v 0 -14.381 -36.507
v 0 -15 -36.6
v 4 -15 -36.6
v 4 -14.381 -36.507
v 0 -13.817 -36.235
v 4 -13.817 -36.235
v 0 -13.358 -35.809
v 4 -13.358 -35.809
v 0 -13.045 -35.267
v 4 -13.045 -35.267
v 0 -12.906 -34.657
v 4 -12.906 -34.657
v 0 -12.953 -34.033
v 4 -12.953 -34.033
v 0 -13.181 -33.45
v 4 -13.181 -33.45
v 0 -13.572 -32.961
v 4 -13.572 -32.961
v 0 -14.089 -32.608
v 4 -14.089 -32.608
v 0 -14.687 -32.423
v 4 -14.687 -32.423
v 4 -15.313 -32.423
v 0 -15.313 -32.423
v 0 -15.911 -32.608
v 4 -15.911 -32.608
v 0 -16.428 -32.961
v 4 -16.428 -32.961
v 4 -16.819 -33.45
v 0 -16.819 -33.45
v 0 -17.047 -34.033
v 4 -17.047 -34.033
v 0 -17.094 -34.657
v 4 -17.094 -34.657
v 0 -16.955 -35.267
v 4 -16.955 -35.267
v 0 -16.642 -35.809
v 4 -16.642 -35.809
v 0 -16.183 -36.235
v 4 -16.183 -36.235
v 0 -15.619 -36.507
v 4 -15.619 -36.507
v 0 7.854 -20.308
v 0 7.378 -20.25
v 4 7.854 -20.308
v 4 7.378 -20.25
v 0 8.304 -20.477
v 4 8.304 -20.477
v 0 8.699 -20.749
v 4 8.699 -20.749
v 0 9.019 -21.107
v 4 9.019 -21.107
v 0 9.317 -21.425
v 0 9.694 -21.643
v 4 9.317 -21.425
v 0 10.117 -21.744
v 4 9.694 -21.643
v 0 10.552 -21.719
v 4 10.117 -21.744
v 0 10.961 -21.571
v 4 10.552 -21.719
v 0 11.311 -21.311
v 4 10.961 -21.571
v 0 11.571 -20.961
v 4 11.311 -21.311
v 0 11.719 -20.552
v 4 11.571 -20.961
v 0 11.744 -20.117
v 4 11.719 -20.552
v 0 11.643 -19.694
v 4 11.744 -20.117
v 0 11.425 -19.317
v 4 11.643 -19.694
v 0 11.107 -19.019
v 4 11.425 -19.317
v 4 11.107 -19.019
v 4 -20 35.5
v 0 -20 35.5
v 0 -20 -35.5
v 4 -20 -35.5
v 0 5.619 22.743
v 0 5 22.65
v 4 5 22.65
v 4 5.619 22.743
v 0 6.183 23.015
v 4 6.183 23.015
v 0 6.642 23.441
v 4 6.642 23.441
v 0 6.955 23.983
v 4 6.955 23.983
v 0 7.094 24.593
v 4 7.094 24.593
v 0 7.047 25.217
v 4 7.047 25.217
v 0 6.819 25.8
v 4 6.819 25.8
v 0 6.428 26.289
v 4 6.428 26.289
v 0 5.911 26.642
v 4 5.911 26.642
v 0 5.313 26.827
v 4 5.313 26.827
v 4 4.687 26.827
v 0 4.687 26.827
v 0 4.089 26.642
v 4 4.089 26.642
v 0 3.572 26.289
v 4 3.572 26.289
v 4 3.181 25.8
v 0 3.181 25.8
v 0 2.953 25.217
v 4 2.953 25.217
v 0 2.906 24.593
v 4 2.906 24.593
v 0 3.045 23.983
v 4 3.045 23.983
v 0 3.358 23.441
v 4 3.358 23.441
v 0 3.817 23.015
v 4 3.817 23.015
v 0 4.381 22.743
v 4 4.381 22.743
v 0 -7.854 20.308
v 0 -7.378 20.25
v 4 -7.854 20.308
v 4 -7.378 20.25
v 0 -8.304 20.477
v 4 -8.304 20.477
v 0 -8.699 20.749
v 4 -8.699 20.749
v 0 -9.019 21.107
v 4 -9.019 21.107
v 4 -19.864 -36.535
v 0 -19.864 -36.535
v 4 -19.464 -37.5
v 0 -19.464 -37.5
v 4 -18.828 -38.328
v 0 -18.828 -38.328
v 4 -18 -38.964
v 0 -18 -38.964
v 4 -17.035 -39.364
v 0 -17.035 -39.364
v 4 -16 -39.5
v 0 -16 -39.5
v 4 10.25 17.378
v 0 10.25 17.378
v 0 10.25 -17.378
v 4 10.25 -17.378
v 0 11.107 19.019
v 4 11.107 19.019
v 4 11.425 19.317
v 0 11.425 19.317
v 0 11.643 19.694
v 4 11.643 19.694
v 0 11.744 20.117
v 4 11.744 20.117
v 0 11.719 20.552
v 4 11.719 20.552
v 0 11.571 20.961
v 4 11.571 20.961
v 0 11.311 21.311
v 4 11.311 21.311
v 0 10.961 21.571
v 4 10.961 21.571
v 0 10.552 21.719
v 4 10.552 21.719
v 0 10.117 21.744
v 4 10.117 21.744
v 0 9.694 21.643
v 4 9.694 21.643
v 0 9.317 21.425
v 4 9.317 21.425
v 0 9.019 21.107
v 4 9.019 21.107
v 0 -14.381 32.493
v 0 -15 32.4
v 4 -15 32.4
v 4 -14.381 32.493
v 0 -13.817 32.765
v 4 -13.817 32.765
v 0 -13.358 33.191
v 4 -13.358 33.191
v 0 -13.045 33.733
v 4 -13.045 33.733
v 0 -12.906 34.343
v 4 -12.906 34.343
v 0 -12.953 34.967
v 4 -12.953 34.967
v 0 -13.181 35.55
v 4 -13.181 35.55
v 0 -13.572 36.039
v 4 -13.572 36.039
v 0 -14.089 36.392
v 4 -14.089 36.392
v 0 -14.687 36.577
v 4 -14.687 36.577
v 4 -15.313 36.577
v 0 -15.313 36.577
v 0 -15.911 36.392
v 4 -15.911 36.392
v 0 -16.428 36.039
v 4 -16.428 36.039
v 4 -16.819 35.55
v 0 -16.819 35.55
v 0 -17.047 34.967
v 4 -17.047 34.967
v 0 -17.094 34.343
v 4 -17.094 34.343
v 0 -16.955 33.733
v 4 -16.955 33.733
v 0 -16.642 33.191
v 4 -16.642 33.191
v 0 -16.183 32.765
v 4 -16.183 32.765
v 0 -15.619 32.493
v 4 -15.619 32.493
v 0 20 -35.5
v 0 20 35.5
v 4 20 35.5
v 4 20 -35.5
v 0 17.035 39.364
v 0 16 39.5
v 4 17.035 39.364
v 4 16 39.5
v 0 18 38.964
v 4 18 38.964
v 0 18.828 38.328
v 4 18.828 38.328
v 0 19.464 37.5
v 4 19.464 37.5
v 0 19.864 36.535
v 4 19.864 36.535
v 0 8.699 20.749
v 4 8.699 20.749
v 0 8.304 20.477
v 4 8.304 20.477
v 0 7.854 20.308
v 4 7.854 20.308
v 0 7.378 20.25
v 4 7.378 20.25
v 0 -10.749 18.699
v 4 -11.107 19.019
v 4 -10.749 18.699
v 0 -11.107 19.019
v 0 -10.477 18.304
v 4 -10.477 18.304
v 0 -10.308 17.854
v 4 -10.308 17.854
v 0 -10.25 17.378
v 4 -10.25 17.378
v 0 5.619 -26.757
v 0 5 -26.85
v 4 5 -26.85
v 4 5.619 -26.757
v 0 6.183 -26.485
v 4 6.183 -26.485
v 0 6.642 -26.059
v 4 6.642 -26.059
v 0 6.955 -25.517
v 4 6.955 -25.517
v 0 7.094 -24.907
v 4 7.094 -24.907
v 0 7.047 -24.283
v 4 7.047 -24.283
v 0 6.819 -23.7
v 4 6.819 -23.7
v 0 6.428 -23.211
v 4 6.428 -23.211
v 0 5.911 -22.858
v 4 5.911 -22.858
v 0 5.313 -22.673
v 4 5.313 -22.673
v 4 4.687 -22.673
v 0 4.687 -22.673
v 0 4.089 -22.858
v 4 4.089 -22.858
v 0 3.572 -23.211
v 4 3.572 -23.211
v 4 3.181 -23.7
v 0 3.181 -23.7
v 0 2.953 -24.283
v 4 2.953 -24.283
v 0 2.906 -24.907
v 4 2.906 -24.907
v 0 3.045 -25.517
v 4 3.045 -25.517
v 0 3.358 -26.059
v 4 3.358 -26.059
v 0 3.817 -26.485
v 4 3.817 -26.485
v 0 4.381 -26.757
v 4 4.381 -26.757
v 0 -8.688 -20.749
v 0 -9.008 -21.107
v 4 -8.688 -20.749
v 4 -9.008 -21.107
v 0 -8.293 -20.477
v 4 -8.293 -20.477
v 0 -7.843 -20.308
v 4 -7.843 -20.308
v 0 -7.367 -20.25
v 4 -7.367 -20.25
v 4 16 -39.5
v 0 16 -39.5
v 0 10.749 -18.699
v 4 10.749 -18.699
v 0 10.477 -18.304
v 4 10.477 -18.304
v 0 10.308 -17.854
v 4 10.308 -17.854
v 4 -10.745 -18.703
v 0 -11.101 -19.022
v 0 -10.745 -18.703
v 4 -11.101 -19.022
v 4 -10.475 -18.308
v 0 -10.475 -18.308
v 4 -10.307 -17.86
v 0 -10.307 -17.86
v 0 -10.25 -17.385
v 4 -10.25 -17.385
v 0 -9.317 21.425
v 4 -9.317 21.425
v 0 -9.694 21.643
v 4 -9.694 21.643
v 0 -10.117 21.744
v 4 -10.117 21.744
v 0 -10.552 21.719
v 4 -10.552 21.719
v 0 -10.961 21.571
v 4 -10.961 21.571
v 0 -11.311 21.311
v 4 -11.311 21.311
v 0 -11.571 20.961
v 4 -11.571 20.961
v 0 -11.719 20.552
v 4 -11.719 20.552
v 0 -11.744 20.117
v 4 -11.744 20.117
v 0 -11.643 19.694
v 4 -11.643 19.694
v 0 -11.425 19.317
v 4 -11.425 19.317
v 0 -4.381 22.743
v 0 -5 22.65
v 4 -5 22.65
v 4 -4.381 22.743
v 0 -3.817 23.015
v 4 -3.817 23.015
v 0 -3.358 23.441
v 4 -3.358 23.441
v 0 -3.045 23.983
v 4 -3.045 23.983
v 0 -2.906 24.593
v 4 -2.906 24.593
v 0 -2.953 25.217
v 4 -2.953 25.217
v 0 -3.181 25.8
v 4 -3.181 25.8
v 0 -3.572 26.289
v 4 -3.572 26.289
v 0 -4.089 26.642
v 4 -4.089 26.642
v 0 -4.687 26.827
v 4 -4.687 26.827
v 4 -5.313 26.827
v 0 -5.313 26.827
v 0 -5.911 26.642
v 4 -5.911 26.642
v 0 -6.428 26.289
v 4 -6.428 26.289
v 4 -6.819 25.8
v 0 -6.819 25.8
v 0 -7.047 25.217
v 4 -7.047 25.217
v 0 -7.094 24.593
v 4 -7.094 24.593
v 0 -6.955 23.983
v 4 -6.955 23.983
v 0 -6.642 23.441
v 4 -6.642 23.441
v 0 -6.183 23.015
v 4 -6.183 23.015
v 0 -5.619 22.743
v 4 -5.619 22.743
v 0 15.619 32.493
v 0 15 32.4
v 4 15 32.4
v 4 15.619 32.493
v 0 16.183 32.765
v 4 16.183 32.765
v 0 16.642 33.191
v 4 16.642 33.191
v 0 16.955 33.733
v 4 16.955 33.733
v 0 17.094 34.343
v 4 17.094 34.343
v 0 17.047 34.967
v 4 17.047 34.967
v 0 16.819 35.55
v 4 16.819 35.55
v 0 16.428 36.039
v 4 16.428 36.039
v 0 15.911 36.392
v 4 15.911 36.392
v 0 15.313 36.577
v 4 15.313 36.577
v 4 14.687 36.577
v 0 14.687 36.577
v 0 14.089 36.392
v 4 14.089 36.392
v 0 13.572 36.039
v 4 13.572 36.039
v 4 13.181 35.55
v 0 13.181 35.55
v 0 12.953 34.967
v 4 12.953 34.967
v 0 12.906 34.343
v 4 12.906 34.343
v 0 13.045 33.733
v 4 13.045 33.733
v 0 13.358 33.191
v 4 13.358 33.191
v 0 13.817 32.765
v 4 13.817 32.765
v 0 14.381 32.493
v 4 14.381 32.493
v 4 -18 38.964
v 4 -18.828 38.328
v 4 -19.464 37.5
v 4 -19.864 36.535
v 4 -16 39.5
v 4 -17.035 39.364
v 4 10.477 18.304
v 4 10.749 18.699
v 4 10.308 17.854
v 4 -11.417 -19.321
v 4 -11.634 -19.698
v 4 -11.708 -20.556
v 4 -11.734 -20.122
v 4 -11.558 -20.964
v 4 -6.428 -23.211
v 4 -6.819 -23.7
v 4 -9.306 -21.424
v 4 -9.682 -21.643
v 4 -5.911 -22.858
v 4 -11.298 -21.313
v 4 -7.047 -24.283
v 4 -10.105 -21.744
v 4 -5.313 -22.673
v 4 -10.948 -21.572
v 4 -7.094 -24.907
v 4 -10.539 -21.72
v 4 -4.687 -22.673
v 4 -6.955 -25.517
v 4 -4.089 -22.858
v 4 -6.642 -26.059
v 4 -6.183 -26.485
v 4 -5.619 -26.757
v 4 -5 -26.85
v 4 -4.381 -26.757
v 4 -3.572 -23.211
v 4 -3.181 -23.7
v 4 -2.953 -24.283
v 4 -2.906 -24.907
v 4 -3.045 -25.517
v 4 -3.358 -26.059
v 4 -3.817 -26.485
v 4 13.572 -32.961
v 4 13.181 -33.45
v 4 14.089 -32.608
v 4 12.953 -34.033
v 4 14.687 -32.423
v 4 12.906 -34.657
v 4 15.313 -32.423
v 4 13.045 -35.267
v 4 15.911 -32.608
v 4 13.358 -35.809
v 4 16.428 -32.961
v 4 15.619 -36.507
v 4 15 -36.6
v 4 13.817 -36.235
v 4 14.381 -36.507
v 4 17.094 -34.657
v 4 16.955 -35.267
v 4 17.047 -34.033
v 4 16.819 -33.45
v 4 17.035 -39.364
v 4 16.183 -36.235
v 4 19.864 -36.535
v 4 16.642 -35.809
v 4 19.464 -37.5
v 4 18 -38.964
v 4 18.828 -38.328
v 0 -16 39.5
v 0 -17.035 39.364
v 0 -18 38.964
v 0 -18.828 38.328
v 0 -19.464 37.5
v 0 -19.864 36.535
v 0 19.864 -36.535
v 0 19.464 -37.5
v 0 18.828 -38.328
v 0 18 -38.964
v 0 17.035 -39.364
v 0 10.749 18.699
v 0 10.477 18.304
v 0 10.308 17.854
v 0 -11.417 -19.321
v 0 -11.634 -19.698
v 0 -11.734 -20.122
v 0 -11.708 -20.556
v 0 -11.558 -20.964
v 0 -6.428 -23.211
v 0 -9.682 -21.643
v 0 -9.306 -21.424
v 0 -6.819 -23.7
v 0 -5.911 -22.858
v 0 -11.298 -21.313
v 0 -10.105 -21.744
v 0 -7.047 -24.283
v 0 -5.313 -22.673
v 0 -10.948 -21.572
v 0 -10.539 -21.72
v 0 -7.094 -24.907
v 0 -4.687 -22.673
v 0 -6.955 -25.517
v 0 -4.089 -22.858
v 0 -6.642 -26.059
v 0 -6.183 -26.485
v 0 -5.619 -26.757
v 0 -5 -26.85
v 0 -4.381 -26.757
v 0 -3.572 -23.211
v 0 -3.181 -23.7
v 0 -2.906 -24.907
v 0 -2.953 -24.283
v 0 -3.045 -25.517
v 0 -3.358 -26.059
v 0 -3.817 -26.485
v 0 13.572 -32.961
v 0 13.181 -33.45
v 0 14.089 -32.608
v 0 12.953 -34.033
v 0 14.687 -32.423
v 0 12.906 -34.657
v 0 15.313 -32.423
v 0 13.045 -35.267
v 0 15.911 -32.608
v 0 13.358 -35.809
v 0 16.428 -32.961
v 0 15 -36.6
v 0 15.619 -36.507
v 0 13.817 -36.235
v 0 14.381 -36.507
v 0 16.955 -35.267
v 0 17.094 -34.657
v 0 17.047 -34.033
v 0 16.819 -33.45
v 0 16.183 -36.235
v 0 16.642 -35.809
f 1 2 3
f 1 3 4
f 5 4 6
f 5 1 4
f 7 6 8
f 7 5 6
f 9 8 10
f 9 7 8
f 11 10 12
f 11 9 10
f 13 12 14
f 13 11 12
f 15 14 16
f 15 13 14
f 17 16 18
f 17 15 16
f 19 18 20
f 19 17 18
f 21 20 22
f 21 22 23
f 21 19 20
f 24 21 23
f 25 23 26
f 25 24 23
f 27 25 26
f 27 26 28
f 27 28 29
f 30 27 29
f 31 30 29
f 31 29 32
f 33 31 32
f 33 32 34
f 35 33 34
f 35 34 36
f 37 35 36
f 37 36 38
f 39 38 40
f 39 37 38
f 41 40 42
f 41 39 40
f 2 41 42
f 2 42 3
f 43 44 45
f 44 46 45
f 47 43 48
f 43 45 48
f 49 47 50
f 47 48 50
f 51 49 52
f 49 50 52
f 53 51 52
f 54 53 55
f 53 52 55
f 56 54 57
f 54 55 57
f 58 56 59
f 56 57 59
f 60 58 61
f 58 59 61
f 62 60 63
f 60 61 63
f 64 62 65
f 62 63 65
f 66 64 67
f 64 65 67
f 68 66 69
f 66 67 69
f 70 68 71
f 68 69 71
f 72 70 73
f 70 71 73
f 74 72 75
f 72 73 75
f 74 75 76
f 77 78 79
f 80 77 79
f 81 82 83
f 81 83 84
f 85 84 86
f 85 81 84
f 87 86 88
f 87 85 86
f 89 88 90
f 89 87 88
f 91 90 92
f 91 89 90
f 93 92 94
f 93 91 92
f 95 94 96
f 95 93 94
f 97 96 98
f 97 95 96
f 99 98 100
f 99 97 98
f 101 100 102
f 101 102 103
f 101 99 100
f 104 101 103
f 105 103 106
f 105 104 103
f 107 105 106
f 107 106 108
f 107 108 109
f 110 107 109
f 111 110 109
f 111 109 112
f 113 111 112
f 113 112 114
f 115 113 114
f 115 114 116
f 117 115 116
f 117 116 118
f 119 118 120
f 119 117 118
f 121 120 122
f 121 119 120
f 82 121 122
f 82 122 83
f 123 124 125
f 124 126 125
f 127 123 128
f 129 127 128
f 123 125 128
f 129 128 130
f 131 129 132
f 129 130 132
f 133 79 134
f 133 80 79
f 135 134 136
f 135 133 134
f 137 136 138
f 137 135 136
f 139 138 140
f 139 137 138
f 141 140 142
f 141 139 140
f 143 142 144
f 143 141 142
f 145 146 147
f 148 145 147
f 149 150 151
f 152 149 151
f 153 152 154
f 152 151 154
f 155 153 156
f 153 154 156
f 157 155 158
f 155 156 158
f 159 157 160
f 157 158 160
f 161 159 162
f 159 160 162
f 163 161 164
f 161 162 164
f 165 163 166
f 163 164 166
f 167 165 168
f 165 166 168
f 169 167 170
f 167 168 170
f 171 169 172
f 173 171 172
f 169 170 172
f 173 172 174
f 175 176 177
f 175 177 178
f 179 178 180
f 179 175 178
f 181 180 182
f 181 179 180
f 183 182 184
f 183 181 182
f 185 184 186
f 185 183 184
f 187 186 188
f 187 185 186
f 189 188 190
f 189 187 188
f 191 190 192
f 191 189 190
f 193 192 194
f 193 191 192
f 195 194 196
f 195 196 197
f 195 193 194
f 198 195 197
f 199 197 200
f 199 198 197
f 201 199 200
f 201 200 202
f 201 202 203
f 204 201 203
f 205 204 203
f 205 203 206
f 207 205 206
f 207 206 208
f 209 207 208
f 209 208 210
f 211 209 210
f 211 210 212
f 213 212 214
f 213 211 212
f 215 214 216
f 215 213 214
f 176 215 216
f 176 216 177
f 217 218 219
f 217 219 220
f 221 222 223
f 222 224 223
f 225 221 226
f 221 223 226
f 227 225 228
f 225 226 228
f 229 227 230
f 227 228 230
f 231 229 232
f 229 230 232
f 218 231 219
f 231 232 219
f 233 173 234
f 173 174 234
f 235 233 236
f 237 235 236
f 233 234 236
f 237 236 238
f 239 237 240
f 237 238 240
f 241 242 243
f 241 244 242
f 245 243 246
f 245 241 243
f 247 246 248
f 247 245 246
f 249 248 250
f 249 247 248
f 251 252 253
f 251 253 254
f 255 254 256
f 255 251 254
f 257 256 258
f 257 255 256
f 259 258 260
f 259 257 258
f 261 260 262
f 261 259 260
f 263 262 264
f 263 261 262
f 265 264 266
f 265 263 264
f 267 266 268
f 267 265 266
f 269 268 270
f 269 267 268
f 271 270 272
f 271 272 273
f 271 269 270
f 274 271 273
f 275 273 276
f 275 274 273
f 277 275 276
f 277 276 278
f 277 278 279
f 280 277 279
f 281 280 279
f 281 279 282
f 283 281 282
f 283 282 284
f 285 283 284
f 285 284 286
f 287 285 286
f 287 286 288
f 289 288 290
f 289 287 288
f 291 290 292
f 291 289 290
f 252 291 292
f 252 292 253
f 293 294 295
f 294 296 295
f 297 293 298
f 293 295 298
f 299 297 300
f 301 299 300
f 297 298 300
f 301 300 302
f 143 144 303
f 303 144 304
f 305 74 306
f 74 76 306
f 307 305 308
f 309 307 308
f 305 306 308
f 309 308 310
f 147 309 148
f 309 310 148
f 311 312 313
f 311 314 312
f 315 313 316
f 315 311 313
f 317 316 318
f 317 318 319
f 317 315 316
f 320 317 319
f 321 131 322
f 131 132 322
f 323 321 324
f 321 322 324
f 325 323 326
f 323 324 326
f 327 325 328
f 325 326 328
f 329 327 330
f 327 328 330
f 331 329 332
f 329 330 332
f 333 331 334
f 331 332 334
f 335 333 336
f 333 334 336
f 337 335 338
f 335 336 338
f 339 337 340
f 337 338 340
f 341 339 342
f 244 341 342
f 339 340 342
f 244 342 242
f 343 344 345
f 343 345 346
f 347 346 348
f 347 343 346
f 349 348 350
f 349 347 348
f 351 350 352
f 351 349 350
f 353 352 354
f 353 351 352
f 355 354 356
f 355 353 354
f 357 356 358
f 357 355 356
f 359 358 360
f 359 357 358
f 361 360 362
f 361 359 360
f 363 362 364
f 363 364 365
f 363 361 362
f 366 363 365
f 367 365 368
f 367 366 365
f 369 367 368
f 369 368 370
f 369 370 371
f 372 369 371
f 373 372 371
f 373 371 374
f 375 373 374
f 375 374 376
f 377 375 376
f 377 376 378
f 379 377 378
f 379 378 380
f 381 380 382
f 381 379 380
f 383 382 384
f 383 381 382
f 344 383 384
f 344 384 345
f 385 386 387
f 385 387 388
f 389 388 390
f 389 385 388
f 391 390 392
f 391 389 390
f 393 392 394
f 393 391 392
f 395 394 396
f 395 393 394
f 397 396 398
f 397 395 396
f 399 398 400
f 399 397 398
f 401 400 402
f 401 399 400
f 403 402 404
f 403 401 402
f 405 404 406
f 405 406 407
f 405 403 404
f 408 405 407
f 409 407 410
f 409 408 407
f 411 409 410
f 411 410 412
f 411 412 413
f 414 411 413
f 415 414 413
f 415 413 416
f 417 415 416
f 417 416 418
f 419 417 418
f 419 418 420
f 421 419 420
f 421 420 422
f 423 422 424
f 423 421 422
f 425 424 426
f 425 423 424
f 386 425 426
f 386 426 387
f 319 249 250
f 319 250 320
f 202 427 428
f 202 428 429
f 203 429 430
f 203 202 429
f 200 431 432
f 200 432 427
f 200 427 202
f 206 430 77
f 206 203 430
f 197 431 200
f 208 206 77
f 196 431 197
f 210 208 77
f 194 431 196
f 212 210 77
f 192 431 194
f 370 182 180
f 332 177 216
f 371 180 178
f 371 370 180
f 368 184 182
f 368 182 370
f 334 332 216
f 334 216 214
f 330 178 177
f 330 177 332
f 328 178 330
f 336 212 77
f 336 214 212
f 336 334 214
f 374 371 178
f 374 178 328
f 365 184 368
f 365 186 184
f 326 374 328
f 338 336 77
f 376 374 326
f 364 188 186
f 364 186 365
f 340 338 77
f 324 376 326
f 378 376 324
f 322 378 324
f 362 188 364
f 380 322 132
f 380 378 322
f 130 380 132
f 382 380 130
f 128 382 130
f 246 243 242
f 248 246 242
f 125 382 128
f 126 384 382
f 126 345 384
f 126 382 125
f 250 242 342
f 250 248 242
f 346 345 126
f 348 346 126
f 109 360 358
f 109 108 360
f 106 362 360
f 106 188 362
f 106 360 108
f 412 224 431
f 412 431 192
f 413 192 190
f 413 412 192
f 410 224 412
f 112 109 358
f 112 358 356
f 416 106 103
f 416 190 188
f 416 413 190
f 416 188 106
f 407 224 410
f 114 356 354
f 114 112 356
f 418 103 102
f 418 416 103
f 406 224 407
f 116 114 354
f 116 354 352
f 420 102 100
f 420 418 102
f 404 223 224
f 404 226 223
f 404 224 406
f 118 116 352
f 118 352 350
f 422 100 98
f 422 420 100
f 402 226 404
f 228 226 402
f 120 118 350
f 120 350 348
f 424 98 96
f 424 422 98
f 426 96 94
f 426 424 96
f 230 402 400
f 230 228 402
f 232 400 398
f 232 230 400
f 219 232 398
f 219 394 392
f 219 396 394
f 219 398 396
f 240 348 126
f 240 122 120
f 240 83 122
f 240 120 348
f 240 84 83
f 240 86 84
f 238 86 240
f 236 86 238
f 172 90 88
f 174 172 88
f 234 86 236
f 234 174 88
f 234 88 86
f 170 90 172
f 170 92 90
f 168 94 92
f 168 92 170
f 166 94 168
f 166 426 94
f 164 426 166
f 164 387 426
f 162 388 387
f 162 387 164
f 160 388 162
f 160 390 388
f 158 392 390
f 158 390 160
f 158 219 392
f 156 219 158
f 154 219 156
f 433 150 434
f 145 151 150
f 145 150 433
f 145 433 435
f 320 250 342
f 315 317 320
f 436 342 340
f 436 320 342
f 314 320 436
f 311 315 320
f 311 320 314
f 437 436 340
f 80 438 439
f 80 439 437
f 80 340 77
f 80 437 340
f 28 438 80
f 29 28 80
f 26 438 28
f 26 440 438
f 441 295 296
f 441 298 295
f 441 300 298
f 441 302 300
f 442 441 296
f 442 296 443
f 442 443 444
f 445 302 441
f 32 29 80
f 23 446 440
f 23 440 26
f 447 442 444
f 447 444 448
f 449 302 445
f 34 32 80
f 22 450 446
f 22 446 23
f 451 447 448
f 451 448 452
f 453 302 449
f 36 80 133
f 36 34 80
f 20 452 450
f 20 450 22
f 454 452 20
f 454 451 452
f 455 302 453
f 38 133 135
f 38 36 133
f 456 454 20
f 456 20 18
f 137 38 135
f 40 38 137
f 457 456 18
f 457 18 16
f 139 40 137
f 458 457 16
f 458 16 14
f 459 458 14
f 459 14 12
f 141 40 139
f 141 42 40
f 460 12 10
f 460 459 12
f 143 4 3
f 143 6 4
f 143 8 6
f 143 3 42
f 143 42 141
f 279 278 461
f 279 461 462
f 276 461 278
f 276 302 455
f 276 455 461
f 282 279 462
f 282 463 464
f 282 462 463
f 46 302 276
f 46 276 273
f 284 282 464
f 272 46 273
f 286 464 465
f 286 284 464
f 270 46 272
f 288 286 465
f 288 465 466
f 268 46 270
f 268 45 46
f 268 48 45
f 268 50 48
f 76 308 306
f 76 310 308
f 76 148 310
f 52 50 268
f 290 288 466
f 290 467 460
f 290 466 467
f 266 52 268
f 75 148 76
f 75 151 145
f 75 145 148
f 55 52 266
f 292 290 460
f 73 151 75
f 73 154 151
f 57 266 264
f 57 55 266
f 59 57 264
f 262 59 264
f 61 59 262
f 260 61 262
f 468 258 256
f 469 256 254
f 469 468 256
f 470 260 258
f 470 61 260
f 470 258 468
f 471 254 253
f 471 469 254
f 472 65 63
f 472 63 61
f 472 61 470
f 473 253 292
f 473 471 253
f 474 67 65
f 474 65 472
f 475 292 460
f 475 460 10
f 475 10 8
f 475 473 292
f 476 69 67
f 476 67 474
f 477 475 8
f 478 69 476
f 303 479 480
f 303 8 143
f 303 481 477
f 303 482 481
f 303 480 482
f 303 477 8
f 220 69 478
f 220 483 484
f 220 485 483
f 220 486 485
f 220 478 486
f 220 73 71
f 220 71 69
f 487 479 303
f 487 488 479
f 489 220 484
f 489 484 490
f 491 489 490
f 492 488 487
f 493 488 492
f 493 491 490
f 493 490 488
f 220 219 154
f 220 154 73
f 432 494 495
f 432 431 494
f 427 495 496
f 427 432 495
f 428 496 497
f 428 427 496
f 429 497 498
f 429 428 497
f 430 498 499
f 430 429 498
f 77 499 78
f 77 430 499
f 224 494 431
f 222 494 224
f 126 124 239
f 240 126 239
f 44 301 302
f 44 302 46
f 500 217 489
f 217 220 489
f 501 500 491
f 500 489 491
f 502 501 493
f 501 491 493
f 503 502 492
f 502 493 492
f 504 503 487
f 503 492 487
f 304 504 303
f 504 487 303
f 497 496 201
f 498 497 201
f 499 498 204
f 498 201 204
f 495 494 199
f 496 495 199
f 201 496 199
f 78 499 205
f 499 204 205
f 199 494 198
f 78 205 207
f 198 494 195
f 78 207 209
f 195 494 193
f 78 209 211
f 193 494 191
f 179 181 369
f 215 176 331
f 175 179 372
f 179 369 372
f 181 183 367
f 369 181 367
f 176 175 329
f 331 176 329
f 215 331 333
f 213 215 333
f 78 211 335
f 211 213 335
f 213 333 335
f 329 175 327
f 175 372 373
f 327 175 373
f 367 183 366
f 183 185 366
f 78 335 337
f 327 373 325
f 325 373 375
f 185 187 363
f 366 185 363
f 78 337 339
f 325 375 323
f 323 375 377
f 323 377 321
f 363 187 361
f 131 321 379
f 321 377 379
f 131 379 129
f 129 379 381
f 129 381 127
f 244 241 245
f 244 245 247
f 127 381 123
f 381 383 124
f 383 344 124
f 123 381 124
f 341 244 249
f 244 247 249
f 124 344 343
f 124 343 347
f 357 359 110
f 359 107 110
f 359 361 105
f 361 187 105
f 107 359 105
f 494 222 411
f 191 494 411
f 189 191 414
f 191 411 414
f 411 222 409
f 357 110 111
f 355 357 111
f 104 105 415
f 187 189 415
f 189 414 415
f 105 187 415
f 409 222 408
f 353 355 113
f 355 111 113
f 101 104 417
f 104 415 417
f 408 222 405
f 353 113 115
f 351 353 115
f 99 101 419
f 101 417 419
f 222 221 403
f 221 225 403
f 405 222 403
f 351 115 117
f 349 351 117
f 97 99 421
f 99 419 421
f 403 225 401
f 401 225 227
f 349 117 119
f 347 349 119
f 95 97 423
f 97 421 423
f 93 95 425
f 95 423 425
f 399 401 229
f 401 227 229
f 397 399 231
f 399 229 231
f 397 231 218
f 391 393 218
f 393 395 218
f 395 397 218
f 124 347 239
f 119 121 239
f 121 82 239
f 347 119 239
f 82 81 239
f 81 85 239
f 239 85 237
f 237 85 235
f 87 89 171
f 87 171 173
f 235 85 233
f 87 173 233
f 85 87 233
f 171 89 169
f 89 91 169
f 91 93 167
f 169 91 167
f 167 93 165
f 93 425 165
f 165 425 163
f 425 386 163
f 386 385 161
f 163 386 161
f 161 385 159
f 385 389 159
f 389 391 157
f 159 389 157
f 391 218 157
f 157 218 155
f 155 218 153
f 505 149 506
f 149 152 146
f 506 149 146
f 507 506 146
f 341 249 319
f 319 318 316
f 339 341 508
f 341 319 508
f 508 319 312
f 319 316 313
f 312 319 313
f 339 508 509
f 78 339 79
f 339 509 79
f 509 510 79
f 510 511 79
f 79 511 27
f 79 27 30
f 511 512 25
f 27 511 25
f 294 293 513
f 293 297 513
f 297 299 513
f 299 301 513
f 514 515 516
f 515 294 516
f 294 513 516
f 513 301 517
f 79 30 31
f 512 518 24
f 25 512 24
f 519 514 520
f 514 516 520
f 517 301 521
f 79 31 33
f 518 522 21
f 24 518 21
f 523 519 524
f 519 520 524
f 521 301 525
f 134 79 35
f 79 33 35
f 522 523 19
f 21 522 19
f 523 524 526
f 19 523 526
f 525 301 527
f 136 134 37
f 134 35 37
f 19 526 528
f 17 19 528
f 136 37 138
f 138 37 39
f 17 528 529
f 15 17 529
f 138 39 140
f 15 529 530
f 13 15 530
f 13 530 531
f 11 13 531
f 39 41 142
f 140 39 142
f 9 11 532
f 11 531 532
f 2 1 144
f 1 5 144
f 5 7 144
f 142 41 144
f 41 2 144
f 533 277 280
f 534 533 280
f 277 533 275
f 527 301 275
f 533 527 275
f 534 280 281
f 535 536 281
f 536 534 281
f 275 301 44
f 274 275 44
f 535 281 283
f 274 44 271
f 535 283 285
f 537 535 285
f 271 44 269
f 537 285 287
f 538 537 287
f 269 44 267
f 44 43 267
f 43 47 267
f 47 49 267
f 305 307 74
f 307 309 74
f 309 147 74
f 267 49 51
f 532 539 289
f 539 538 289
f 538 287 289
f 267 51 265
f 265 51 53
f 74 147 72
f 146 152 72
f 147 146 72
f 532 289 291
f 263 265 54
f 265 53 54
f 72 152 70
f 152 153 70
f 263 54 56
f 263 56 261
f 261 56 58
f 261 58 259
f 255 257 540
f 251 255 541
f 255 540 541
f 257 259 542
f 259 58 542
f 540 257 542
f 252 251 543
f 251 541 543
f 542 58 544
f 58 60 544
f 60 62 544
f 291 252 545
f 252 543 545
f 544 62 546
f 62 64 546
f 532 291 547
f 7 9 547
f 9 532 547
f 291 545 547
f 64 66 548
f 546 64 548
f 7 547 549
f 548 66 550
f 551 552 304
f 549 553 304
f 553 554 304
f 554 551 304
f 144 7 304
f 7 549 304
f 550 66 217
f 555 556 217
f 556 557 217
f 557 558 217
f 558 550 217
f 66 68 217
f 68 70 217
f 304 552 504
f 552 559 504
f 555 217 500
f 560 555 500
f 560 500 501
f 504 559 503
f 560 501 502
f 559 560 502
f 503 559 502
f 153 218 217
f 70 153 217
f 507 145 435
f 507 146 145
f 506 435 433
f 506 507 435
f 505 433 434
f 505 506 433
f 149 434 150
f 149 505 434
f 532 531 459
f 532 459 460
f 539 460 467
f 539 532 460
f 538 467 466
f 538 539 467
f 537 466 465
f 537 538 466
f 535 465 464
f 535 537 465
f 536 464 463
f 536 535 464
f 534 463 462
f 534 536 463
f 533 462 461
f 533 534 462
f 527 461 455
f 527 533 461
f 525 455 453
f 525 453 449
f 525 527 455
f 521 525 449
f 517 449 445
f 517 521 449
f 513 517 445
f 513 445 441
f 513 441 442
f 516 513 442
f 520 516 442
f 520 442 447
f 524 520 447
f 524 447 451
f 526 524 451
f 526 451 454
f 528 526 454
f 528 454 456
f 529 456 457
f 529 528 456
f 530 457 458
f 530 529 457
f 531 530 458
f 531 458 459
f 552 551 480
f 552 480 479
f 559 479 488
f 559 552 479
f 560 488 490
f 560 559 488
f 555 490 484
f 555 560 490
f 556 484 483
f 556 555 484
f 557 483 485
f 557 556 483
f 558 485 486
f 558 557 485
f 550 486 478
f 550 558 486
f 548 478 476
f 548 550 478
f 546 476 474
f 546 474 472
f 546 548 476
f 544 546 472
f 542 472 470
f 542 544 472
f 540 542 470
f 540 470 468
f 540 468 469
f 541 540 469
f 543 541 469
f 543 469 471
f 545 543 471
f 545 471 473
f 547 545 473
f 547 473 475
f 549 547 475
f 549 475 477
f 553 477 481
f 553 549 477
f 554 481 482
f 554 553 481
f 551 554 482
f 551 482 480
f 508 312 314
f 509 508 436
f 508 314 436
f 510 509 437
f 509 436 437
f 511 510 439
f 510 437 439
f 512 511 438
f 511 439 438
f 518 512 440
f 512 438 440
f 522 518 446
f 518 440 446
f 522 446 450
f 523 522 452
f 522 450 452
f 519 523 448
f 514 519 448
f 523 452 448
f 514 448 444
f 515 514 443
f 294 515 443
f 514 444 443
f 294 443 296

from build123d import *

# Parameters (mm, degrees)
SKETCH_1_W          = 79
SKETCH_1_H          = 40
SKETCH_1_R          = 2.1
SKETCH_1_W_2        = 40.5
SKETCH_1_H_2        = 20.5
EXTRUDE_1_DEPTH     = 4
FILLET_1_R          = 4
SKETCH_2_R          = 1.5
CUT_EXTRUDE_1_DEPTH = 10
FILLET_2_R          = 2


with BuildPart() as part:
    # 草图1 → 凸台-拉伸1 (new body)
    with BuildSketch(Plane(origin=(0, 0, 0), x_dir=(0, 0, -1), z_dir=(1, 0, 0))):
        Rectangle(SKETCH_1_W, SKETCH_1_H)
        with Locations((-34.5, 15)):
            Circle(SKETCH_1_R, mode=Mode.SUBTRACT)
        with Locations((-34.5, -15)):
            Circle(SKETCH_1_R, mode=Mode.SUBTRACT)
        with Locations((-24.75, -5)):
            Circle(SKETCH_1_R, mode=Mode.SUBTRACT)
        with Locations((-24.75, 5)):
            Circle(SKETCH_1_R, mode=Mode.SUBTRACT)
        with Locations((24.75, 5)):
            Circle(SKETCH_1_R, mode=Mode.SUBTRACT)
        with Locations((24.75, -5)):
            Circle(SKETCH_1_R, mode=Mode.SUBTRACT)
        with Locations((34.5, 15)):
            Circle(SKETCH_1_R, mode=Mode.SUBTRACT)
        with Locations((34.5, -15)):
            Circle(SKETCH_1_R, mode=Mode.SUBTRACT)
        Rectangle(SKETCH_1_W_2, SKETCH_1_H_2, mode=Mode.SUBTRACT)
    extrude(amount=EXTRUDE_1_DEPTH)

    # 圆角1
    fillet_1_edges = [part.edges().sort_by_distance(p)[0] for p in [
        (2, -20, -39.5),
        (2, -20, 39.5),
        (2, 20, 39.5),
        (2, 20, -39.5),
    ]]
    fillet(fillet_1_edges, radius=FILLET_1_R)

    # 草图2 → 切除-拉伸1 (cut)
    with BuildSketch(Plane(origin=(4, 0, 0), x_dir=(0, 0, -1), z_dir=(1, 0, 0))):
        with Locations((-20.25, 10.25)):
            Circle(SKETCH_2_R)
        with Locations((-20.25, -10.25)):
            Circle(SKETCH_2_R)
        with Locations((20.25, -10.239026698)):
            Circle(SKETCH_2_R)
        with Locations((20.25, 10.25)):
            Circle(SKETCH_2_R)
    extrude(amount=-CUT_EXTRUDE_1_DEPTH, mode=Mode.SUBTRACT)

    # 圆角2
    fillet_2_edges = [part.edges().sort_by_distance(p)[0] for p in [
        (2, -10.25, 18.75),
        (2, 8.75, -20.25),
        (2, -10.25, -18.750040138),
        (2, -8.75, 20.25),
        (2, 8.75, 20.25),
        (2, 10.25, 18.75),
        (2, 10.25, -18.75),
        (2, -8.739026698, -20.25),
    ]]
    fillet(fillet_2_edges, radius=FILLET_2_R)


solid = part.part
